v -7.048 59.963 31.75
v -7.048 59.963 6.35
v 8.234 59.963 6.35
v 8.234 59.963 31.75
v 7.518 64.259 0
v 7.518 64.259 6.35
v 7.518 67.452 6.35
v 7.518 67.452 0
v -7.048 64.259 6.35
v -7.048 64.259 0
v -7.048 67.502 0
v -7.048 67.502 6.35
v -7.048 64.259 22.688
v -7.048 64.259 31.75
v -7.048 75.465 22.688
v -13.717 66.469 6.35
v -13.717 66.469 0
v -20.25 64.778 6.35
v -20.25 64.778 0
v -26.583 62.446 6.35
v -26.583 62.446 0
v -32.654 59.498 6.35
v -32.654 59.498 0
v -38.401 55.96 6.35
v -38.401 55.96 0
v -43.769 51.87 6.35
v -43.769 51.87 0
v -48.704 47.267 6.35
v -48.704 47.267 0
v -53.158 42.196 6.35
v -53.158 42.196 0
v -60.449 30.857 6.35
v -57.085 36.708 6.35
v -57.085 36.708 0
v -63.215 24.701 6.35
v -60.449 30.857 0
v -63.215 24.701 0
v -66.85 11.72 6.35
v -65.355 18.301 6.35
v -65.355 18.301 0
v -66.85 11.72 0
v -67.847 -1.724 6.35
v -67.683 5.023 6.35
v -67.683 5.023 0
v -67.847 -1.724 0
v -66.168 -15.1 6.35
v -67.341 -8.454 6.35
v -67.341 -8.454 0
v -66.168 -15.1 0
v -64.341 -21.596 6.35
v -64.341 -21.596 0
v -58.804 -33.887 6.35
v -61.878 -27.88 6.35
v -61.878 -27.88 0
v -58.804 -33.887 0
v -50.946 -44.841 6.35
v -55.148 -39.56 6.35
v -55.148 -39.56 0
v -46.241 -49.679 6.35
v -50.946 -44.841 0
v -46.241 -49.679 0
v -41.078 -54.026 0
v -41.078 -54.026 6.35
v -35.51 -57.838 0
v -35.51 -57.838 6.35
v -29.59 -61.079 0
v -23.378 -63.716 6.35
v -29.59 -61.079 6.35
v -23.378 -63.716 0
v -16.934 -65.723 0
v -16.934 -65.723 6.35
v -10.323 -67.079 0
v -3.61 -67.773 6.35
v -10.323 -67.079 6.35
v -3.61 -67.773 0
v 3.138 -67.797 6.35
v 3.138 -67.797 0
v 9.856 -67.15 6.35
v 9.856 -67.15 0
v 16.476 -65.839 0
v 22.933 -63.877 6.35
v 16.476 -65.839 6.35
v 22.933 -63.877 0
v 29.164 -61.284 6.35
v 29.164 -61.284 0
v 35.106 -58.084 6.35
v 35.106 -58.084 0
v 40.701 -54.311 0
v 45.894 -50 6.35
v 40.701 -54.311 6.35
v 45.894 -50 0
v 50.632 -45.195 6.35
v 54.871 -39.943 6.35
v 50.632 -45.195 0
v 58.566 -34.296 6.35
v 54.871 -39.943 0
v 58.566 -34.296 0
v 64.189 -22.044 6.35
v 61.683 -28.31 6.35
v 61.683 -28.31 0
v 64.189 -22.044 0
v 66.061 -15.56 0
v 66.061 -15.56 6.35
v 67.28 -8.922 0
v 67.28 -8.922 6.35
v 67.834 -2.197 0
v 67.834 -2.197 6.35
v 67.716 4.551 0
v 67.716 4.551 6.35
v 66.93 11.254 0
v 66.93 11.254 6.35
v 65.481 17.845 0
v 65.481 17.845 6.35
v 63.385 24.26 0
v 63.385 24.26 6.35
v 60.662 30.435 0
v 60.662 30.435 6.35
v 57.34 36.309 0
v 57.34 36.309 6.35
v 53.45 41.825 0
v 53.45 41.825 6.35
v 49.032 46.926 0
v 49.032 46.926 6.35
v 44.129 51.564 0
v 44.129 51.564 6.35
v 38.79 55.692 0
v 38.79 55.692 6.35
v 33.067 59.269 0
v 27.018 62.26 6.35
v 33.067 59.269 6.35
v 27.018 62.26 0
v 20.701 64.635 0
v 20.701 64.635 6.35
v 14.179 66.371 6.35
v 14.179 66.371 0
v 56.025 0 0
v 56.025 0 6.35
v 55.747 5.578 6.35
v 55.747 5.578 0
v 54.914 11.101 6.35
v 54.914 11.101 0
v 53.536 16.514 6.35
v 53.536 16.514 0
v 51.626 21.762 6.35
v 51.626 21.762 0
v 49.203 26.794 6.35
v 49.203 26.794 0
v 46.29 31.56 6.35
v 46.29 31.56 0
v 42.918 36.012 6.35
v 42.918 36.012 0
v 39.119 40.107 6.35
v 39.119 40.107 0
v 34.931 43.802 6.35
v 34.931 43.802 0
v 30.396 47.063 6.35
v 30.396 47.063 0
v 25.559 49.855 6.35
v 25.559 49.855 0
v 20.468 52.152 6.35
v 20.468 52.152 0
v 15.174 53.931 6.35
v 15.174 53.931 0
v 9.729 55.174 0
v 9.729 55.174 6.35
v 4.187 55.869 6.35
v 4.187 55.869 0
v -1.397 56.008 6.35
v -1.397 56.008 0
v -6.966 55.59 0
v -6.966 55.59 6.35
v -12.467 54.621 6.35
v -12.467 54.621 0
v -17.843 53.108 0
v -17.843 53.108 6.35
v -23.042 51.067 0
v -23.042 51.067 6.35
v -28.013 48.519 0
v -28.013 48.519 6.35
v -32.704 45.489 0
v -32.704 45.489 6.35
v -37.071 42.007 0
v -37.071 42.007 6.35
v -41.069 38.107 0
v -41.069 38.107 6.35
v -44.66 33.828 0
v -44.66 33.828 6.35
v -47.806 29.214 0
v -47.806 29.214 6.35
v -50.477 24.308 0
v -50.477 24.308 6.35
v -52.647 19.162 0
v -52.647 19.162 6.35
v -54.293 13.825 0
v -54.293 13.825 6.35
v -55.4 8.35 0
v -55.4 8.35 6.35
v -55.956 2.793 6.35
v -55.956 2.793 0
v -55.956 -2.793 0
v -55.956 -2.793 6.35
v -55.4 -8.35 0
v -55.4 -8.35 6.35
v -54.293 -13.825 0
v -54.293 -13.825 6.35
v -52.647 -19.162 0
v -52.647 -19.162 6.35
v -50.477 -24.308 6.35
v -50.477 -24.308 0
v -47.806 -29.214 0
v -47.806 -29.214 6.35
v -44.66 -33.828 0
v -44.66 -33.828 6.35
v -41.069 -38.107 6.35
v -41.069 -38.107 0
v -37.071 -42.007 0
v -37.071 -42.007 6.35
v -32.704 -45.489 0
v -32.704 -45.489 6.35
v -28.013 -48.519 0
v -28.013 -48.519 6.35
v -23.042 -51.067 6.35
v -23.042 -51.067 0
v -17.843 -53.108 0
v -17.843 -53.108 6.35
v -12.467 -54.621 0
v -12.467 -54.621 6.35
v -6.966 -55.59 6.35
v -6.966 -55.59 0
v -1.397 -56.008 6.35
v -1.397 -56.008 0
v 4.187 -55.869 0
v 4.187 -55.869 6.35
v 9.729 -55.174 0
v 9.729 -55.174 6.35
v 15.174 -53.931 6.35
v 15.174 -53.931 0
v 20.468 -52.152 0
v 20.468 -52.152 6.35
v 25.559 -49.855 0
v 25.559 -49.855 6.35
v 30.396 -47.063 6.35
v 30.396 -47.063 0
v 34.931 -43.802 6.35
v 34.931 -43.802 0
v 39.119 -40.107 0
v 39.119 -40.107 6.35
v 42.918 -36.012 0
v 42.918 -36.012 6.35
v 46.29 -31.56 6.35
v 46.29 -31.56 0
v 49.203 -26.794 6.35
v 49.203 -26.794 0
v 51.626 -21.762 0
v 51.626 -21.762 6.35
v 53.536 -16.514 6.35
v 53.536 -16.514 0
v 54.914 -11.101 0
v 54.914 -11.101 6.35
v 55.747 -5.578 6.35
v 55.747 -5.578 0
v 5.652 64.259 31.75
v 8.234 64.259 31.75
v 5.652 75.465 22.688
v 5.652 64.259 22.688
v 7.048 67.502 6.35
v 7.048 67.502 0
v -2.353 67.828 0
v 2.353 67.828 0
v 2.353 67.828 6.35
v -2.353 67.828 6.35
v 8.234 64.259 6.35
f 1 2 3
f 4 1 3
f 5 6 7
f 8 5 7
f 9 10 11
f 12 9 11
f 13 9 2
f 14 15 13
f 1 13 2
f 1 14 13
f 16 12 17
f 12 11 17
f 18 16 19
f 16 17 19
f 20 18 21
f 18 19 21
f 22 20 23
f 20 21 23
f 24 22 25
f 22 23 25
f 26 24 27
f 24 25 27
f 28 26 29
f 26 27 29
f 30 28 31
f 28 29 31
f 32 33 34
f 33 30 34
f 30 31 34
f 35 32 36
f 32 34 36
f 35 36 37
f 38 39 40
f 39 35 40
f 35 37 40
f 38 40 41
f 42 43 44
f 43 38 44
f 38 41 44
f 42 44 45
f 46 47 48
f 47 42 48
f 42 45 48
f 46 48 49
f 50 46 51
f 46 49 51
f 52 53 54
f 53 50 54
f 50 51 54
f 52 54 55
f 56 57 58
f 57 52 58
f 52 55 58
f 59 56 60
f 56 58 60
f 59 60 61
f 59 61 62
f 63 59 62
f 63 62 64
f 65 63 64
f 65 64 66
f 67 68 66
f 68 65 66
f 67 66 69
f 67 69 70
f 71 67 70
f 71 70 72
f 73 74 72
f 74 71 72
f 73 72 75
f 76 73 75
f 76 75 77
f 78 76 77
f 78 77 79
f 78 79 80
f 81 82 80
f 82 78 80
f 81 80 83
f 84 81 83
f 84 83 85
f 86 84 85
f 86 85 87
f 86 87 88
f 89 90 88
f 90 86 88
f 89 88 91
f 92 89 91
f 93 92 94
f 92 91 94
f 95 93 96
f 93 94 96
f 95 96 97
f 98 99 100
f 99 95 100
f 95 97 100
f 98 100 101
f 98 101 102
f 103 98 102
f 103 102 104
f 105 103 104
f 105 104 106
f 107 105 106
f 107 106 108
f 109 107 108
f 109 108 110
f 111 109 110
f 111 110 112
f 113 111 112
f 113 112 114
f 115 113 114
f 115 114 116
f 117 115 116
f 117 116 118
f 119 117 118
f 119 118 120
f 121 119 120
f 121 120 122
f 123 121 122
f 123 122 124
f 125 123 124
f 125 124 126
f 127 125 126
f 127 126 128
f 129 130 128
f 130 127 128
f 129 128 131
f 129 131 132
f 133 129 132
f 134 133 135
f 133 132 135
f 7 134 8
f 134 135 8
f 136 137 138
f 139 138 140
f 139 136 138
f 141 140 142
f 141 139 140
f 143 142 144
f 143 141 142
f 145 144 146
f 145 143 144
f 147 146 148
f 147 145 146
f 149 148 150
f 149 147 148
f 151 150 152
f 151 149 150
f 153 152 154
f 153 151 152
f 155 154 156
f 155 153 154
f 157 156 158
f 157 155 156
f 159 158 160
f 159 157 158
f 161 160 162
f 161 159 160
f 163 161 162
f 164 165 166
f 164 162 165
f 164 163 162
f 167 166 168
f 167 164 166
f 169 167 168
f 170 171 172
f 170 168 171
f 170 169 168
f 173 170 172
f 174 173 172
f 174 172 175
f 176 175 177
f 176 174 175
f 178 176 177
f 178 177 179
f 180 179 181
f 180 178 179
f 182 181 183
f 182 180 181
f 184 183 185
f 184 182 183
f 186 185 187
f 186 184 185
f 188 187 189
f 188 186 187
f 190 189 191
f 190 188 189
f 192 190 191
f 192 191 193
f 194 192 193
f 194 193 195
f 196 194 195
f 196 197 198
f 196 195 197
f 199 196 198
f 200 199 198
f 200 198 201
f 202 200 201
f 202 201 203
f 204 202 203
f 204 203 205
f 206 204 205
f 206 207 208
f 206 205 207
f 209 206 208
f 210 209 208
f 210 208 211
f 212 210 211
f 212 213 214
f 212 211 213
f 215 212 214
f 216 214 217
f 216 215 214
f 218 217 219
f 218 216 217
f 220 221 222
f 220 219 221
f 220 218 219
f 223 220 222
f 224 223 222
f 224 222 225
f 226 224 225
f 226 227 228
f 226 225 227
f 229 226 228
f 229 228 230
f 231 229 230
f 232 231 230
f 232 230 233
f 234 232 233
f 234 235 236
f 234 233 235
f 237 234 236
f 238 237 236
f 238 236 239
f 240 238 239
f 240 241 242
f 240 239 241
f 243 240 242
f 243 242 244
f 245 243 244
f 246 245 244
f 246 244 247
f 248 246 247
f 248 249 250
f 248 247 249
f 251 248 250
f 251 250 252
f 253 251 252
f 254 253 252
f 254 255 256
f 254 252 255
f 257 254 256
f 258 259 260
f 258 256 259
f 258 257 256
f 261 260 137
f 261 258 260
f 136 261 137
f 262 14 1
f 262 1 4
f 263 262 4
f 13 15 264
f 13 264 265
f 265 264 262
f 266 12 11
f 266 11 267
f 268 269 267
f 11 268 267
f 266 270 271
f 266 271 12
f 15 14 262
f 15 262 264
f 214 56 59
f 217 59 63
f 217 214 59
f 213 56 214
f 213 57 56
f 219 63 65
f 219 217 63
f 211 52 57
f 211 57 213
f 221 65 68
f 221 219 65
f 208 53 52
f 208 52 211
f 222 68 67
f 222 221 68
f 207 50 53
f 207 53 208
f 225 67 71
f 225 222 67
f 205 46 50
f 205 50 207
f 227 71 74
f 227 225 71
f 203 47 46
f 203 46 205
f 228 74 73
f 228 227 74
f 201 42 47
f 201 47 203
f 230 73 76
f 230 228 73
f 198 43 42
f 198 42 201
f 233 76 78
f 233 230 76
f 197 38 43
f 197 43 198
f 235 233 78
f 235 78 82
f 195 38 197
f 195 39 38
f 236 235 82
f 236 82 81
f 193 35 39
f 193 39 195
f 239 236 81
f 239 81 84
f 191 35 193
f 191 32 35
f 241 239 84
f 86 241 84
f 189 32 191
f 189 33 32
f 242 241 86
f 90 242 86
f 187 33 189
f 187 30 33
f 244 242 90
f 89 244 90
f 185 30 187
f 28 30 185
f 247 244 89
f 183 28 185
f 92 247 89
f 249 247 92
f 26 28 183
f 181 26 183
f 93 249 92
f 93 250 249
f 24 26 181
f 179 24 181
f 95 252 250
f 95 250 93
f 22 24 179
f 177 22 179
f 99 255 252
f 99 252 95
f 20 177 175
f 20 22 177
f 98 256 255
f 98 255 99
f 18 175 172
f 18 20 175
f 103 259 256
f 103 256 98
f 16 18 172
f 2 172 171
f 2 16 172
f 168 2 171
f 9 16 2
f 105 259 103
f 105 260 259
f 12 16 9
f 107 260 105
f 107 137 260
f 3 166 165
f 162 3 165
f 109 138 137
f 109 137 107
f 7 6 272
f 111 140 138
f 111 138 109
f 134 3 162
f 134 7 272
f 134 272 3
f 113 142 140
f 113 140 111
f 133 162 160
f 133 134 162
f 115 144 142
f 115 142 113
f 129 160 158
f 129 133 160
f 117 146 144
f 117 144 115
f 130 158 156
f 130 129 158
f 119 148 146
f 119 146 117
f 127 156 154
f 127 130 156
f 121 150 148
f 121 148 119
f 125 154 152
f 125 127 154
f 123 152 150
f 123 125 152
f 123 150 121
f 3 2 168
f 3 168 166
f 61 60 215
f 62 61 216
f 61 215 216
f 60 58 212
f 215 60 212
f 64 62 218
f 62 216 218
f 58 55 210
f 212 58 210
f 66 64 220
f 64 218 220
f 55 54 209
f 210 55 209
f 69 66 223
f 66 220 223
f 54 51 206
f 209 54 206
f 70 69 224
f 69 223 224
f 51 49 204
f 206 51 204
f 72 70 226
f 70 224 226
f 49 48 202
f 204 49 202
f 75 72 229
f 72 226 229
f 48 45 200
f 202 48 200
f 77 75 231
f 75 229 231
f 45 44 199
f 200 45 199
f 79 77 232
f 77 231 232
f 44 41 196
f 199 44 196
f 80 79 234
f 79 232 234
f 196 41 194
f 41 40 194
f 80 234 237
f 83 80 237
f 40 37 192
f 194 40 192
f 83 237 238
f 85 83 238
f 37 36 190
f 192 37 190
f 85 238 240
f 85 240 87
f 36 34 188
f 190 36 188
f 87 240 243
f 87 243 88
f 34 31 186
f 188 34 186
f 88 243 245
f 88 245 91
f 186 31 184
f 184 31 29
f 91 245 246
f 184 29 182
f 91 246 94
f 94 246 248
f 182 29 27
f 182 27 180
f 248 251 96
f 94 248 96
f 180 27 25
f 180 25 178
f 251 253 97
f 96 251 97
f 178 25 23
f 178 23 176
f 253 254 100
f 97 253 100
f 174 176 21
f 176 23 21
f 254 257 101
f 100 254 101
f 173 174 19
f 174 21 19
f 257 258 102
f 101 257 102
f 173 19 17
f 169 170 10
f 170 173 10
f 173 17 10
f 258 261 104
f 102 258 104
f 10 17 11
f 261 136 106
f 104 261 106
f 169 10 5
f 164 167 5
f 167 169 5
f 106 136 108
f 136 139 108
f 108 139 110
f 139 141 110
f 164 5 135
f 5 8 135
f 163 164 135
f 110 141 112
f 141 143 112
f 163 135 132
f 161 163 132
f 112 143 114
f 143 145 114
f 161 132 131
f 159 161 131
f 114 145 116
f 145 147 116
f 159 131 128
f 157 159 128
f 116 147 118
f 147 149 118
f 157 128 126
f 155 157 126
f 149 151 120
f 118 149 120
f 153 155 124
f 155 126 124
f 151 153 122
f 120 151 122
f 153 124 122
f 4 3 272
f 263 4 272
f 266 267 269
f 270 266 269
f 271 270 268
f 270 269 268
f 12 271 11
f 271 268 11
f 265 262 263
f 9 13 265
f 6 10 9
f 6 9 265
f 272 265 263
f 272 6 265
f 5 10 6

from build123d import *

# Parameters (mm, degrees)
F0_R     = 67.8691846605
F1_DEPTH = 6.35
F2_R     = 56.0252972028
F3_DEPTH = 19.05
F4_W     = 14.5653890634
F4_H     = 3.2436804546
F5_DEPTH = 6.35
F6_W     = 15.2813623847
F6_H     = 4.2958371341
F7_DEPTH = 25.4
F9_DEPTH = 12.7


with BuildPart() as f1:
    # F0 (on Top) → F1 (new body)
    with BuildSketch(Plane.XY):
        Circle(F0_R)
    extrude(amount=F1_DEPTH)

    # F2 (on Top) → F3 (cut)
    with BuildSketch(Plane.XY):
        Circle(F2_R)
    extrude(amount=F3_DEPTH, mode=Mode.SUBTRACT)

    # F4 (on face) → F5 (cut)
    with BuildSketch(Plane.XY.offset(6.35)):
        with Locations((0.2350237127, 65.8804305679)):
            Rectangle(F4_W, F4_H)
    extrude(amount=-F5_DEPTH, mode=Mode.SUBTRACT)

    # F6 (on face) → F7 (join)
    with BuildSketch(Plane.XY.offset(6.35)):
        with Locations((0.5930103733, 62.1106717736)):
            Rectangle(F6_W, F6_H)
    extrude(amount=F7_DEPTH)

    # F8 (on face) → F9 (join)
    with BuildSketch(Plane(origin=(-7.047670819, 0, 0), x_dir=(0, -1, 0), z_dir=(-1, 0, 0))):
        Polygon((-75.4654482007, 22.6880926639), (-64.2585903406, 22.6880926639), (-64.2585903406, 31.75), align=None)
    extrude(amount=-F9_DEPTH)


solid = f1.part
